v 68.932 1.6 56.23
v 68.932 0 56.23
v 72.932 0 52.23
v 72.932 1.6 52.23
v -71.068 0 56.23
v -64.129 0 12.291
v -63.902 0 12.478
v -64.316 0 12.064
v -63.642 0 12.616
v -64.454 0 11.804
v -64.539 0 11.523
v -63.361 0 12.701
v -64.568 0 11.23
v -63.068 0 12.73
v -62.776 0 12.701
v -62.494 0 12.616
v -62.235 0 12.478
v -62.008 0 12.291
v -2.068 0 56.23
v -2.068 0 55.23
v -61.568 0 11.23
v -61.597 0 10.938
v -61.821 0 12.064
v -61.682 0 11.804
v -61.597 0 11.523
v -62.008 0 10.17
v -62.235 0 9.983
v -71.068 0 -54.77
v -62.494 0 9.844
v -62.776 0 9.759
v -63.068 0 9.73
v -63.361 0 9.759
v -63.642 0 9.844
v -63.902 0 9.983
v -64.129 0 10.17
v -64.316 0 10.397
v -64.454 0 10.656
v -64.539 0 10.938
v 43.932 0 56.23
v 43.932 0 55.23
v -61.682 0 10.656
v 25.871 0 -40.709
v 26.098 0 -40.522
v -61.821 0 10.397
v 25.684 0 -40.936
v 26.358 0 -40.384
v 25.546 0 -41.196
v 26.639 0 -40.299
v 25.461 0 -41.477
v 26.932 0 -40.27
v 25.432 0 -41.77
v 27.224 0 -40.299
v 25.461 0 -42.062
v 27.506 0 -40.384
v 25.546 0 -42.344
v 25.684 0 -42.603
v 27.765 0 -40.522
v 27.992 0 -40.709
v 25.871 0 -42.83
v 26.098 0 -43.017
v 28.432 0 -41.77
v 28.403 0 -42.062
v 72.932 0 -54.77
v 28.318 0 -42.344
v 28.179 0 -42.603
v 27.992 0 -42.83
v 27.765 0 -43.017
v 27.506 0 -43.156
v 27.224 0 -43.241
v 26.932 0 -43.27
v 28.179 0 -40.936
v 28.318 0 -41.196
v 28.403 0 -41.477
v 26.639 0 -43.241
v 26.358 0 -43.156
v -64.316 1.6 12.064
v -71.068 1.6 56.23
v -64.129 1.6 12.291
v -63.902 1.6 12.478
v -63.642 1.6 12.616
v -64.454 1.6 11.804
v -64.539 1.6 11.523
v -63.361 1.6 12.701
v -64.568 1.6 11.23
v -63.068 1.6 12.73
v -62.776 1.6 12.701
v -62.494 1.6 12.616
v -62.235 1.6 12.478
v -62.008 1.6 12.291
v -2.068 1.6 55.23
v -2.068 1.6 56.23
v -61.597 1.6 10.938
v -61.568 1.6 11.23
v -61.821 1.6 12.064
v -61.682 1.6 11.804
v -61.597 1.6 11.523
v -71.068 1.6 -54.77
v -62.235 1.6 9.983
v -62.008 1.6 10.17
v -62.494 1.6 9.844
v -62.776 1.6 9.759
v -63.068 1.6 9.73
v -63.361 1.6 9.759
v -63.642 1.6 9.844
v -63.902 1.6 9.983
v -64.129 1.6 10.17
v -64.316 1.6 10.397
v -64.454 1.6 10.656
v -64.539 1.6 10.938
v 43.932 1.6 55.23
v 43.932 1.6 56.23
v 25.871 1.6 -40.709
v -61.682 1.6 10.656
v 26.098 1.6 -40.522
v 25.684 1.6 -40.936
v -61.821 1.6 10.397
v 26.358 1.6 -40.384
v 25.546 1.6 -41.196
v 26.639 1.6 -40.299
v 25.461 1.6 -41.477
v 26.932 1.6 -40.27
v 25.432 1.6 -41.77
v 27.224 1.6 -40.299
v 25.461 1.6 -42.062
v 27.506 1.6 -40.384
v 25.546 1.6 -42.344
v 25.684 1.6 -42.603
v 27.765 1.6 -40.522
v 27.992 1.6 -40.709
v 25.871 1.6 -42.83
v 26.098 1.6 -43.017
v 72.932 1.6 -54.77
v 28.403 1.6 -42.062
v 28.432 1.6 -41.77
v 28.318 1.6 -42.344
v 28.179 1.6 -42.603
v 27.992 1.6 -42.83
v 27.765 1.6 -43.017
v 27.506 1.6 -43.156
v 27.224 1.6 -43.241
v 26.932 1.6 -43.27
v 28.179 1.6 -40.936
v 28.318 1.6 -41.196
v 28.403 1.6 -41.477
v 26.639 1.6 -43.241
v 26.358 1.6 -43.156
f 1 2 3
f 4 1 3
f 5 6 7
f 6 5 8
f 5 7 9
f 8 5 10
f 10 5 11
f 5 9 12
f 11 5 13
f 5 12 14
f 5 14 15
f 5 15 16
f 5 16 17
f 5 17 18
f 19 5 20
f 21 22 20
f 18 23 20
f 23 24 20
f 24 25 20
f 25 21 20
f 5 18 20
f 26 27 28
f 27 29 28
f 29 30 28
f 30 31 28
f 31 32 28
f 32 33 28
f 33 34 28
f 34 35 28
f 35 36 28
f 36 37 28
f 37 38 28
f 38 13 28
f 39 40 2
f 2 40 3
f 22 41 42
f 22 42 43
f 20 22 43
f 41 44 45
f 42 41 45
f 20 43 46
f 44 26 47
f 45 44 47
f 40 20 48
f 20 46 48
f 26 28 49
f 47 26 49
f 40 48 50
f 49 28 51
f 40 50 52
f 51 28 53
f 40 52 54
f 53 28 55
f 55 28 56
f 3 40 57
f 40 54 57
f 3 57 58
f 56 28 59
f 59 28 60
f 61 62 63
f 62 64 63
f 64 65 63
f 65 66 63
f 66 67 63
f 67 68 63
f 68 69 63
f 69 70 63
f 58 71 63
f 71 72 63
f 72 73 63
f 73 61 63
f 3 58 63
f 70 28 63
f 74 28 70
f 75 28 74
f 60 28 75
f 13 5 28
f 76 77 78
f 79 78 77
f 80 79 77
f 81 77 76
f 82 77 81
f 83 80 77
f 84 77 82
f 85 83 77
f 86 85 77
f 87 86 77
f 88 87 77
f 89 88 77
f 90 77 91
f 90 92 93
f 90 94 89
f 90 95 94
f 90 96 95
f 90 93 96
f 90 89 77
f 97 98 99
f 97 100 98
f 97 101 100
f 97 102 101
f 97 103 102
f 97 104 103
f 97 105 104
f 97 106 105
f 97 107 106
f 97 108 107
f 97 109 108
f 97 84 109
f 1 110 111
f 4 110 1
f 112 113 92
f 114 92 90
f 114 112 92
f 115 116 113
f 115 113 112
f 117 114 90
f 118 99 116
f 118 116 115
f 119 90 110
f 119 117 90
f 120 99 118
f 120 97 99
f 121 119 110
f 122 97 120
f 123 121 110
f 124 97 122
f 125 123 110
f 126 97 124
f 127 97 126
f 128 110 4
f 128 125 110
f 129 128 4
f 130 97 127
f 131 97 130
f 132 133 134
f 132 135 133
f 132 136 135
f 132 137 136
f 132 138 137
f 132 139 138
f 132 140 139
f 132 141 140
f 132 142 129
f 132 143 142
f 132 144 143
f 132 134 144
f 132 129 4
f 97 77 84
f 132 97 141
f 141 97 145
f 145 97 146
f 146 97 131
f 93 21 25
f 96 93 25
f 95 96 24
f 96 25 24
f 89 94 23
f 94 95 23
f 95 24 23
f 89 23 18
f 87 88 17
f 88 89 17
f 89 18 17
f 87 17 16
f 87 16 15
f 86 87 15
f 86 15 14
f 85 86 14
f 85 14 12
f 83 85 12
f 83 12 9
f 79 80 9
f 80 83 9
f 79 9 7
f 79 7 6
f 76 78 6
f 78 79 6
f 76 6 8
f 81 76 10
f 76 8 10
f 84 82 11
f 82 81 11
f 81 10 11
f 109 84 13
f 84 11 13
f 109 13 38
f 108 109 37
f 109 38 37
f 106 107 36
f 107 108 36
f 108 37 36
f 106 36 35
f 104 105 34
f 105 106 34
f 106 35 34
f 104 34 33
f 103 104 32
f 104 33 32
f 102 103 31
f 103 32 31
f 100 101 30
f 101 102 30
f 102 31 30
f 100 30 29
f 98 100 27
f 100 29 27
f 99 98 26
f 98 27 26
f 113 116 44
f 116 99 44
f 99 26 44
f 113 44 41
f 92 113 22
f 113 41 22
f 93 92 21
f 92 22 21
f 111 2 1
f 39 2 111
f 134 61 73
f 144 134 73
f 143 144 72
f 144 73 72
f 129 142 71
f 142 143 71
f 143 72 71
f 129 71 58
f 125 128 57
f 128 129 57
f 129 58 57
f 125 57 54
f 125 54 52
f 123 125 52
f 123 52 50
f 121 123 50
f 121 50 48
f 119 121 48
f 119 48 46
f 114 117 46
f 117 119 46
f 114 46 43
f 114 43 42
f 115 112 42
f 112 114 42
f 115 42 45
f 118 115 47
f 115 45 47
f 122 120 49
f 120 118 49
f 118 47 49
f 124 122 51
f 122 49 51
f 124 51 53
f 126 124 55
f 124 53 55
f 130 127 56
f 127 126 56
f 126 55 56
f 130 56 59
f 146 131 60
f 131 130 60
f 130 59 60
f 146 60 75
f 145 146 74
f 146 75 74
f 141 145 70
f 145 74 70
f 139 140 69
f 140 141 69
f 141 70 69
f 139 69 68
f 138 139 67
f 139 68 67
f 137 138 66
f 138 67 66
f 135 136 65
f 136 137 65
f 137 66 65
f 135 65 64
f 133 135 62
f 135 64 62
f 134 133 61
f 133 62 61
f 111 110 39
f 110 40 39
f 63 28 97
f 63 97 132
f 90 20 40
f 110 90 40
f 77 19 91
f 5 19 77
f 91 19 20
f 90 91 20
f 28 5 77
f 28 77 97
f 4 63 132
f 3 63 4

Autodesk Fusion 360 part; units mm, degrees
sketch "Sketch1" plane through (0, 0, 0) normal (0, 1, 0) x (1, 0, 0)
  line L0 (-71.0683, 54.7697) -> (72.9317, 54.7697)
  line L1 (72.9317, 54.7697) -> (72.9317, -52.2303)
  line L2 (-71.0683, -56.2303) -> (-71.0683, 54.7697)
  line L3 (-2.0683, -56.2303) -> (-2.0683, -55.2303)
  line L4 (-2.0683, -55.2303) -> (43.9317, -55.2303)
  line L5 (43.9317, -55.2303) -> (43.9317, -56.2303)
  line L6 (68.9317, -56.2303) -> (43.9317, -56.2303)
  line L7 (-2.0683, -56.2303) -> (-71.0683, -56.2303)
  line L8 (72.9317, -52.2303) -> (68.9317, -52.2303) construction
  line L9 (68.9317, -56.2303) -> (68.9317, -52.2303) construction
  line L10 (68.9317, -56.2303) -> (72.9317, -52.2303)
  circle A0 centre (-63.0683, -11.2303) radius 1.5
  circle A1 centre (26.9317, 41.7697) radius 1.5
  dimension "d3" = 1
  dimension "d4" = 46
  dimension "d5" = 69
  dimension "d6" = 4
  dimension "d8" = 4
  dimension "d11" = 4
  dimension "d14" = 144
  dimension "d17" = 25
  dimension "d18" = 3
  dimension "d19" = 8
  dimension "d20" = 66
  dimension "d21" = 111
  dimension "d23" = 111
  dimension "d24" = 45
  dimension "d25" = 3
  dimension "d26" = 13
  dimension "d27" = 46
  dimension "d28" = 98
extrude "Extrude1" add sketch "Sketch1" along normal blind 1.6
